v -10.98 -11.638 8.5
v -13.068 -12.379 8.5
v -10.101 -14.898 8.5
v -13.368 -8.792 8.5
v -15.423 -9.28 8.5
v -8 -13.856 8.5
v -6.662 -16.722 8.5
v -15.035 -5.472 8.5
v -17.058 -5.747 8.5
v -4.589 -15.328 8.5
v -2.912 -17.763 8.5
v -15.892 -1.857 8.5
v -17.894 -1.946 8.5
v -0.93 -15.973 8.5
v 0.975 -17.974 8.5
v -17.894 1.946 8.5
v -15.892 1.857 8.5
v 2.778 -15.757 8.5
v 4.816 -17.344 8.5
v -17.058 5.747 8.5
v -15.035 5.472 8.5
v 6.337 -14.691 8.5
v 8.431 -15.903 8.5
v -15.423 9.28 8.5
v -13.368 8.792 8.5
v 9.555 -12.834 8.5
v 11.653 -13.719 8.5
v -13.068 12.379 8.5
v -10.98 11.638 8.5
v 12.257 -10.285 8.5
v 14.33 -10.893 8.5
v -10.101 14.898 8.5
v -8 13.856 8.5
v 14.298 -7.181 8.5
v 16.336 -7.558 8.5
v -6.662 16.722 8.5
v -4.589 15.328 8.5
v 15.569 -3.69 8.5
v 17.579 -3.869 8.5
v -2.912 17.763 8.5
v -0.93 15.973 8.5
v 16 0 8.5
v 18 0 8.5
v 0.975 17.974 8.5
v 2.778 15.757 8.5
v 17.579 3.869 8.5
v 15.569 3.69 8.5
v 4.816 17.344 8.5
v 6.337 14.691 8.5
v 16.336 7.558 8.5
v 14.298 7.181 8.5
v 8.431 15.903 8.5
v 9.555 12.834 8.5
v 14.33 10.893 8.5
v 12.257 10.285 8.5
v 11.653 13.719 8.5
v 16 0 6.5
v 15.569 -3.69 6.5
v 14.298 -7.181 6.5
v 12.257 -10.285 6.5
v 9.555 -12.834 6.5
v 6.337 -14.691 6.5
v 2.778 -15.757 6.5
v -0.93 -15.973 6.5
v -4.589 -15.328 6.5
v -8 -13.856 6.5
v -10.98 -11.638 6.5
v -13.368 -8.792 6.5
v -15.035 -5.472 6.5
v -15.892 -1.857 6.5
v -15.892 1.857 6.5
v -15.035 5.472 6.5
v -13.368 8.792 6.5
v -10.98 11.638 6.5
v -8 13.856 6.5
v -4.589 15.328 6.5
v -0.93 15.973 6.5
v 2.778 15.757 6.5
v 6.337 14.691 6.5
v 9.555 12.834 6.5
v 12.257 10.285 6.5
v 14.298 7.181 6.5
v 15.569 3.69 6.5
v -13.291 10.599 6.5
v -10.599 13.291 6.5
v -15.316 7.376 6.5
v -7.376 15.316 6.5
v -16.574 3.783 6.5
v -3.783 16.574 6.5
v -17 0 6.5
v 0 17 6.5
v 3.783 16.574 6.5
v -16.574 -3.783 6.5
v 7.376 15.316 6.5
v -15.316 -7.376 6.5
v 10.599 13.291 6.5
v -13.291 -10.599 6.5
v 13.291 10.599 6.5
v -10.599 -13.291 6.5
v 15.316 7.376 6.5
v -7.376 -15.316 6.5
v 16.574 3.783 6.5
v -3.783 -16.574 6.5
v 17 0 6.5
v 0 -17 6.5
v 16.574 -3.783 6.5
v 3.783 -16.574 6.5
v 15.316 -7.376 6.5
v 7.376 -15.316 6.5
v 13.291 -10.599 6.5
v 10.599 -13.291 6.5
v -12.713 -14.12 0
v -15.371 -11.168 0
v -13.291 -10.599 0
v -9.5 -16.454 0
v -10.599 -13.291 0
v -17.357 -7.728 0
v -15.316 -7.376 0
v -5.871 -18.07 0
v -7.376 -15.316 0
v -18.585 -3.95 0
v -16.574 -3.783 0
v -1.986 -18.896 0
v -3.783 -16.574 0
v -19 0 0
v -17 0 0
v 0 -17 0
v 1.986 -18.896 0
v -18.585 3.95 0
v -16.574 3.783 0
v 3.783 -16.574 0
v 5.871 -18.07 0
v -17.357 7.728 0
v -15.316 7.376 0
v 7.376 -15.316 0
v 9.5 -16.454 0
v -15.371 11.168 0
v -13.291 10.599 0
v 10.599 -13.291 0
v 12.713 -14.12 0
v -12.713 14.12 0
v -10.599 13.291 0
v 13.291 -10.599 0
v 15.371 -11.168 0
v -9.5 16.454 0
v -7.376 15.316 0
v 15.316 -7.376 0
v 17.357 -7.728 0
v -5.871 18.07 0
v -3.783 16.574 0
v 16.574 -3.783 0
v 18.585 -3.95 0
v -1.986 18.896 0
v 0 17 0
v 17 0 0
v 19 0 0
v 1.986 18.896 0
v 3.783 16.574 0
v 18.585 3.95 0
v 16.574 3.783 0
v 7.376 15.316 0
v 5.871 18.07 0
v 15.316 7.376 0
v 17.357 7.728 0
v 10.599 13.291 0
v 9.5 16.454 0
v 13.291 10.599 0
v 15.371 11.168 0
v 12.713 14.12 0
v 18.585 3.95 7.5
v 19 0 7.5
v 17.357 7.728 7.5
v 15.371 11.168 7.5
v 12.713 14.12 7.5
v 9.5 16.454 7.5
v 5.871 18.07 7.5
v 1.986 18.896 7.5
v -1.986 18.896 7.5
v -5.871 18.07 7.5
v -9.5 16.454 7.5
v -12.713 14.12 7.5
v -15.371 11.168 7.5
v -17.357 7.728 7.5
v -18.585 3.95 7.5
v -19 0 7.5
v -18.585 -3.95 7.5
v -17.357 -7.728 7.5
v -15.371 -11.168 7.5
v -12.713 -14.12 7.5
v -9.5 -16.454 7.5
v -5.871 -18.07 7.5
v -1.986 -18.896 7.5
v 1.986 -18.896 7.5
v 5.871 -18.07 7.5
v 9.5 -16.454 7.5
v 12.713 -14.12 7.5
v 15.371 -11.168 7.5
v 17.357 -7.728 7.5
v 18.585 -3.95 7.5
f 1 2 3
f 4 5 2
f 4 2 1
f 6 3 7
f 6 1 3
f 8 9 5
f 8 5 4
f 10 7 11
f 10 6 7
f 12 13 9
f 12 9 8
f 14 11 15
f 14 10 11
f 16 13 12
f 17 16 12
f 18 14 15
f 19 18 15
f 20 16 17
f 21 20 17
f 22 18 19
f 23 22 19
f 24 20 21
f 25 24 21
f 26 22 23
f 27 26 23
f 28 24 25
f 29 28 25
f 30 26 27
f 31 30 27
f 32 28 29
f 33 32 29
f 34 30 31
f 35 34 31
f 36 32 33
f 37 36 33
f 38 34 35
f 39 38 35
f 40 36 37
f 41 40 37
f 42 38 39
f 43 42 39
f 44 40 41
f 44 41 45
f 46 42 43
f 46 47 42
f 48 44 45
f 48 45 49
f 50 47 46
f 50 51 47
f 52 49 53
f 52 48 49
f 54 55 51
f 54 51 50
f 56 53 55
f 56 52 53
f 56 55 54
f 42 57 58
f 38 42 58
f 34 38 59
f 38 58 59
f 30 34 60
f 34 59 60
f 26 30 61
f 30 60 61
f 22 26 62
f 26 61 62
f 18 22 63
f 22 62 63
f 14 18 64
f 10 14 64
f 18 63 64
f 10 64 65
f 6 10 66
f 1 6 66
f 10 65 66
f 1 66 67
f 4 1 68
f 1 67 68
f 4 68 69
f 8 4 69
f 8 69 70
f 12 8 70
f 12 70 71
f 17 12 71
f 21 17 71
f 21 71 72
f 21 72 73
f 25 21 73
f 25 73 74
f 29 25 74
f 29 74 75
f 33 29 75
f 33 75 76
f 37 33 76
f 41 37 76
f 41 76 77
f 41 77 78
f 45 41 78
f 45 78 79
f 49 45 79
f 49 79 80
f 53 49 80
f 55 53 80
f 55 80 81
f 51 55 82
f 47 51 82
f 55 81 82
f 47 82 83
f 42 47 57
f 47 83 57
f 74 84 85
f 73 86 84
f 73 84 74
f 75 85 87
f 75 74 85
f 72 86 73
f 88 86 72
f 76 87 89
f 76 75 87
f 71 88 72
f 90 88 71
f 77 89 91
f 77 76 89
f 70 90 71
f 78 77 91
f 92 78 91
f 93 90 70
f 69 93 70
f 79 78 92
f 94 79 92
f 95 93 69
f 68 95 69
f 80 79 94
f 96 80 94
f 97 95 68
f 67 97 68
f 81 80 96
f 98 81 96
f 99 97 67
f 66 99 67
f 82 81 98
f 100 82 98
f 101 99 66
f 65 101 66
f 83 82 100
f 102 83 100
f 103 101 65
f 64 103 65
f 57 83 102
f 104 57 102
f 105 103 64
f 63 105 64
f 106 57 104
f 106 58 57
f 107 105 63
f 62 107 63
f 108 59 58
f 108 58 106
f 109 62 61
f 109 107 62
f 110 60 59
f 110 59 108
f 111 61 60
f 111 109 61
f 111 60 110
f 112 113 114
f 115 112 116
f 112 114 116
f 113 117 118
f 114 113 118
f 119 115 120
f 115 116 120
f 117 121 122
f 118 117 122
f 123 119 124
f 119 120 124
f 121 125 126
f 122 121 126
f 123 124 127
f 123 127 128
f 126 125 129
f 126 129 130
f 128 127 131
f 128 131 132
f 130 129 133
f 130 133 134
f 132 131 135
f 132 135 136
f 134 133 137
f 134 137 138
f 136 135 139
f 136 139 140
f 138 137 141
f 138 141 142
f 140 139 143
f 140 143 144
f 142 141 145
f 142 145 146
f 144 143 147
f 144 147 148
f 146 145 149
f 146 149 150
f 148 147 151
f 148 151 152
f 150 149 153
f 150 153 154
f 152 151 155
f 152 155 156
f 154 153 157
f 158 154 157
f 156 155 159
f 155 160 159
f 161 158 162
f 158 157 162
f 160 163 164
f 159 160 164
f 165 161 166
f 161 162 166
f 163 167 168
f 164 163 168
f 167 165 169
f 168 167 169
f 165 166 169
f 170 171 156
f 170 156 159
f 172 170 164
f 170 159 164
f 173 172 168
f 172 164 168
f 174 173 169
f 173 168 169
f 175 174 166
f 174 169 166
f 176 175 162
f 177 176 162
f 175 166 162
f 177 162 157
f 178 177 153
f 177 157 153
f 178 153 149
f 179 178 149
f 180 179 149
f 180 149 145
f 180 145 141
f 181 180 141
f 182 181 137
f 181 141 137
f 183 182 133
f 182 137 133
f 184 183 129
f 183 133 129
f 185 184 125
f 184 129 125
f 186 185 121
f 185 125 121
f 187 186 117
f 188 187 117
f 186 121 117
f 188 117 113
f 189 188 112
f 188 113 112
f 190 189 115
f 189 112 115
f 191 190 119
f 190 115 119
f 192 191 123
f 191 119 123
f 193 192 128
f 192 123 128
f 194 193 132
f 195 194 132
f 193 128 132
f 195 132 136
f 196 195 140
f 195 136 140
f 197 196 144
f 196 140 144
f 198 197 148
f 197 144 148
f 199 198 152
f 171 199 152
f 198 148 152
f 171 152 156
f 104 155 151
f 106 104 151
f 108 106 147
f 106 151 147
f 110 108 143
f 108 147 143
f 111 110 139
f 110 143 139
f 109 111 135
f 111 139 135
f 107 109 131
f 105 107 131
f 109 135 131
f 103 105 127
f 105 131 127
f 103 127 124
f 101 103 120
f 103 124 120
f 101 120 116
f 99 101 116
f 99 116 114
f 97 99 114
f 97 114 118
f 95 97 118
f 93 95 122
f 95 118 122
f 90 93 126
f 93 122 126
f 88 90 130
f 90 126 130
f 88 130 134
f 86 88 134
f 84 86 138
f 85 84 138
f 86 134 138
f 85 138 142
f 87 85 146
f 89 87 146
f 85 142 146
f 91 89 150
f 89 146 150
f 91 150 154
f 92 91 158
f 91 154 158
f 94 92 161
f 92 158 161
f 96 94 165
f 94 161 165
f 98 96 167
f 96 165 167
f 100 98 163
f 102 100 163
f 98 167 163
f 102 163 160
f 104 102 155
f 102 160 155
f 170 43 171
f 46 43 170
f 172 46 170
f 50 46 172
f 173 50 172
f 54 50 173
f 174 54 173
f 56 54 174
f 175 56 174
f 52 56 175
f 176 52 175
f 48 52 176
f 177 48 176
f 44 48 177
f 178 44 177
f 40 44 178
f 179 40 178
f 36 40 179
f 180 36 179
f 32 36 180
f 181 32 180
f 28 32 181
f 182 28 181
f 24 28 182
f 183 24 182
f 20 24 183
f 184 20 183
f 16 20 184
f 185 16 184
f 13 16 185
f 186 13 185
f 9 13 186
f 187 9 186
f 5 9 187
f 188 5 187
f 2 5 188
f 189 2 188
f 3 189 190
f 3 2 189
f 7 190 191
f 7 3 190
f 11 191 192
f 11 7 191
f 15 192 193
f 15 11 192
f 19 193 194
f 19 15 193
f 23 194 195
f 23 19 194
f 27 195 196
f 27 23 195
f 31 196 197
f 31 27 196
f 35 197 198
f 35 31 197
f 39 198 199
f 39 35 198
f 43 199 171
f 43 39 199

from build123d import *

# Parameters (mm, degrees)
F0_R     = 19
F1_DEPTH = 8.5
F2_R     = 16
F3_DEPTH = 10
F4_R     = 17
F5_DEPTH = 6.5
F6_SIZE  = 1


with BuildPart() as f1:
    # F0 (on Top) → F1 (new body)
    with BuildSketch(Plane.XY):
        Circle(F0_R)
    extrude(amount=F1_DEPTH)

    # F2 (on face) → F3 (cut)
    with BuildSketch(Plane(origin=(0, 0, 0), x_dir=(1, 0, 0), z_dir=(0, 0, -1))):
        Circle(F2_R)
    extrude(amount=-F3_DEPTH, mode=Mode.SUBTRACT)

    # F4 (on face) → F5 (cut)
    with BuildSketch(Plane(origin=(0, 0, 0), x_dir=(1, 0, 0), z_dir=(0, 0, -1))):
        Circle(F4_R)
    extrude(amount=-F5_DEPTH, mode=Mode.SUBTRACT)

    # F6
    f6_edges = [f1.edges().sort_by_distance(p)[0] for p in [
        (-19, 0, 8.5),
    ]]
    chamfer(f6_edges, length=F6_SIZE)


solid = f1.part
